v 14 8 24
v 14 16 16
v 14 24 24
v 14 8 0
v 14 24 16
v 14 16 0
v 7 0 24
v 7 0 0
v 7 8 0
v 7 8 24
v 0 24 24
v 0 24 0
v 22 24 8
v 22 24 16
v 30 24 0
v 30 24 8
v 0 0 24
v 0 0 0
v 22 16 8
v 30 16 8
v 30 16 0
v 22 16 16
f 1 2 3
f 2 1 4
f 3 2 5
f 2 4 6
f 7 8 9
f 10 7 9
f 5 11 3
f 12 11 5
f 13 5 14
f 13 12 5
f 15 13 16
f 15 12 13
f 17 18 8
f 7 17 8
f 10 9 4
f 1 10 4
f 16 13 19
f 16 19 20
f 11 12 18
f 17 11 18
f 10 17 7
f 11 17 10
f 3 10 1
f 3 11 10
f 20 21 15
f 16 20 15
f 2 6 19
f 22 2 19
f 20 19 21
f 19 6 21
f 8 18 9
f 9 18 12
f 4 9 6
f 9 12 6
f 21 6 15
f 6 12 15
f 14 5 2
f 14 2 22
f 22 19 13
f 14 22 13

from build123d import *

# Parameters (mm, degrees)
F1_DEPTH = 24
F0_W     = 8
F0_H     = 8
F2_DEPTH = 16
F3_DEPTH = 8


with BuildPart() as f1:
    # F0 (on Top) → F1 (new body)
    with BuildSketch(Plane.XY):
        Polygon((0, 24), (0, 0), (7, 0), (7, 8), (14, 8), (14, 16), (14, 24), align=None)
    extrude(amount=F1_DEPTH)

    # F0 (on Top) → F2 (join)
    with BuildSketch(Plane.XY):
        with Locations((18, 20)):
            Rectangle(F0_W, F0_H)
    extrude(amount=F2_DEPTH)

    # F0 (on Top) → F3 (join)
    with BuildSketch(Plane.XY):
        with Locations((26, 20)):
            Rectangle(F0_W, F0_H)
    extrude(amount=F3_DEPTH)


solid = f1.part
